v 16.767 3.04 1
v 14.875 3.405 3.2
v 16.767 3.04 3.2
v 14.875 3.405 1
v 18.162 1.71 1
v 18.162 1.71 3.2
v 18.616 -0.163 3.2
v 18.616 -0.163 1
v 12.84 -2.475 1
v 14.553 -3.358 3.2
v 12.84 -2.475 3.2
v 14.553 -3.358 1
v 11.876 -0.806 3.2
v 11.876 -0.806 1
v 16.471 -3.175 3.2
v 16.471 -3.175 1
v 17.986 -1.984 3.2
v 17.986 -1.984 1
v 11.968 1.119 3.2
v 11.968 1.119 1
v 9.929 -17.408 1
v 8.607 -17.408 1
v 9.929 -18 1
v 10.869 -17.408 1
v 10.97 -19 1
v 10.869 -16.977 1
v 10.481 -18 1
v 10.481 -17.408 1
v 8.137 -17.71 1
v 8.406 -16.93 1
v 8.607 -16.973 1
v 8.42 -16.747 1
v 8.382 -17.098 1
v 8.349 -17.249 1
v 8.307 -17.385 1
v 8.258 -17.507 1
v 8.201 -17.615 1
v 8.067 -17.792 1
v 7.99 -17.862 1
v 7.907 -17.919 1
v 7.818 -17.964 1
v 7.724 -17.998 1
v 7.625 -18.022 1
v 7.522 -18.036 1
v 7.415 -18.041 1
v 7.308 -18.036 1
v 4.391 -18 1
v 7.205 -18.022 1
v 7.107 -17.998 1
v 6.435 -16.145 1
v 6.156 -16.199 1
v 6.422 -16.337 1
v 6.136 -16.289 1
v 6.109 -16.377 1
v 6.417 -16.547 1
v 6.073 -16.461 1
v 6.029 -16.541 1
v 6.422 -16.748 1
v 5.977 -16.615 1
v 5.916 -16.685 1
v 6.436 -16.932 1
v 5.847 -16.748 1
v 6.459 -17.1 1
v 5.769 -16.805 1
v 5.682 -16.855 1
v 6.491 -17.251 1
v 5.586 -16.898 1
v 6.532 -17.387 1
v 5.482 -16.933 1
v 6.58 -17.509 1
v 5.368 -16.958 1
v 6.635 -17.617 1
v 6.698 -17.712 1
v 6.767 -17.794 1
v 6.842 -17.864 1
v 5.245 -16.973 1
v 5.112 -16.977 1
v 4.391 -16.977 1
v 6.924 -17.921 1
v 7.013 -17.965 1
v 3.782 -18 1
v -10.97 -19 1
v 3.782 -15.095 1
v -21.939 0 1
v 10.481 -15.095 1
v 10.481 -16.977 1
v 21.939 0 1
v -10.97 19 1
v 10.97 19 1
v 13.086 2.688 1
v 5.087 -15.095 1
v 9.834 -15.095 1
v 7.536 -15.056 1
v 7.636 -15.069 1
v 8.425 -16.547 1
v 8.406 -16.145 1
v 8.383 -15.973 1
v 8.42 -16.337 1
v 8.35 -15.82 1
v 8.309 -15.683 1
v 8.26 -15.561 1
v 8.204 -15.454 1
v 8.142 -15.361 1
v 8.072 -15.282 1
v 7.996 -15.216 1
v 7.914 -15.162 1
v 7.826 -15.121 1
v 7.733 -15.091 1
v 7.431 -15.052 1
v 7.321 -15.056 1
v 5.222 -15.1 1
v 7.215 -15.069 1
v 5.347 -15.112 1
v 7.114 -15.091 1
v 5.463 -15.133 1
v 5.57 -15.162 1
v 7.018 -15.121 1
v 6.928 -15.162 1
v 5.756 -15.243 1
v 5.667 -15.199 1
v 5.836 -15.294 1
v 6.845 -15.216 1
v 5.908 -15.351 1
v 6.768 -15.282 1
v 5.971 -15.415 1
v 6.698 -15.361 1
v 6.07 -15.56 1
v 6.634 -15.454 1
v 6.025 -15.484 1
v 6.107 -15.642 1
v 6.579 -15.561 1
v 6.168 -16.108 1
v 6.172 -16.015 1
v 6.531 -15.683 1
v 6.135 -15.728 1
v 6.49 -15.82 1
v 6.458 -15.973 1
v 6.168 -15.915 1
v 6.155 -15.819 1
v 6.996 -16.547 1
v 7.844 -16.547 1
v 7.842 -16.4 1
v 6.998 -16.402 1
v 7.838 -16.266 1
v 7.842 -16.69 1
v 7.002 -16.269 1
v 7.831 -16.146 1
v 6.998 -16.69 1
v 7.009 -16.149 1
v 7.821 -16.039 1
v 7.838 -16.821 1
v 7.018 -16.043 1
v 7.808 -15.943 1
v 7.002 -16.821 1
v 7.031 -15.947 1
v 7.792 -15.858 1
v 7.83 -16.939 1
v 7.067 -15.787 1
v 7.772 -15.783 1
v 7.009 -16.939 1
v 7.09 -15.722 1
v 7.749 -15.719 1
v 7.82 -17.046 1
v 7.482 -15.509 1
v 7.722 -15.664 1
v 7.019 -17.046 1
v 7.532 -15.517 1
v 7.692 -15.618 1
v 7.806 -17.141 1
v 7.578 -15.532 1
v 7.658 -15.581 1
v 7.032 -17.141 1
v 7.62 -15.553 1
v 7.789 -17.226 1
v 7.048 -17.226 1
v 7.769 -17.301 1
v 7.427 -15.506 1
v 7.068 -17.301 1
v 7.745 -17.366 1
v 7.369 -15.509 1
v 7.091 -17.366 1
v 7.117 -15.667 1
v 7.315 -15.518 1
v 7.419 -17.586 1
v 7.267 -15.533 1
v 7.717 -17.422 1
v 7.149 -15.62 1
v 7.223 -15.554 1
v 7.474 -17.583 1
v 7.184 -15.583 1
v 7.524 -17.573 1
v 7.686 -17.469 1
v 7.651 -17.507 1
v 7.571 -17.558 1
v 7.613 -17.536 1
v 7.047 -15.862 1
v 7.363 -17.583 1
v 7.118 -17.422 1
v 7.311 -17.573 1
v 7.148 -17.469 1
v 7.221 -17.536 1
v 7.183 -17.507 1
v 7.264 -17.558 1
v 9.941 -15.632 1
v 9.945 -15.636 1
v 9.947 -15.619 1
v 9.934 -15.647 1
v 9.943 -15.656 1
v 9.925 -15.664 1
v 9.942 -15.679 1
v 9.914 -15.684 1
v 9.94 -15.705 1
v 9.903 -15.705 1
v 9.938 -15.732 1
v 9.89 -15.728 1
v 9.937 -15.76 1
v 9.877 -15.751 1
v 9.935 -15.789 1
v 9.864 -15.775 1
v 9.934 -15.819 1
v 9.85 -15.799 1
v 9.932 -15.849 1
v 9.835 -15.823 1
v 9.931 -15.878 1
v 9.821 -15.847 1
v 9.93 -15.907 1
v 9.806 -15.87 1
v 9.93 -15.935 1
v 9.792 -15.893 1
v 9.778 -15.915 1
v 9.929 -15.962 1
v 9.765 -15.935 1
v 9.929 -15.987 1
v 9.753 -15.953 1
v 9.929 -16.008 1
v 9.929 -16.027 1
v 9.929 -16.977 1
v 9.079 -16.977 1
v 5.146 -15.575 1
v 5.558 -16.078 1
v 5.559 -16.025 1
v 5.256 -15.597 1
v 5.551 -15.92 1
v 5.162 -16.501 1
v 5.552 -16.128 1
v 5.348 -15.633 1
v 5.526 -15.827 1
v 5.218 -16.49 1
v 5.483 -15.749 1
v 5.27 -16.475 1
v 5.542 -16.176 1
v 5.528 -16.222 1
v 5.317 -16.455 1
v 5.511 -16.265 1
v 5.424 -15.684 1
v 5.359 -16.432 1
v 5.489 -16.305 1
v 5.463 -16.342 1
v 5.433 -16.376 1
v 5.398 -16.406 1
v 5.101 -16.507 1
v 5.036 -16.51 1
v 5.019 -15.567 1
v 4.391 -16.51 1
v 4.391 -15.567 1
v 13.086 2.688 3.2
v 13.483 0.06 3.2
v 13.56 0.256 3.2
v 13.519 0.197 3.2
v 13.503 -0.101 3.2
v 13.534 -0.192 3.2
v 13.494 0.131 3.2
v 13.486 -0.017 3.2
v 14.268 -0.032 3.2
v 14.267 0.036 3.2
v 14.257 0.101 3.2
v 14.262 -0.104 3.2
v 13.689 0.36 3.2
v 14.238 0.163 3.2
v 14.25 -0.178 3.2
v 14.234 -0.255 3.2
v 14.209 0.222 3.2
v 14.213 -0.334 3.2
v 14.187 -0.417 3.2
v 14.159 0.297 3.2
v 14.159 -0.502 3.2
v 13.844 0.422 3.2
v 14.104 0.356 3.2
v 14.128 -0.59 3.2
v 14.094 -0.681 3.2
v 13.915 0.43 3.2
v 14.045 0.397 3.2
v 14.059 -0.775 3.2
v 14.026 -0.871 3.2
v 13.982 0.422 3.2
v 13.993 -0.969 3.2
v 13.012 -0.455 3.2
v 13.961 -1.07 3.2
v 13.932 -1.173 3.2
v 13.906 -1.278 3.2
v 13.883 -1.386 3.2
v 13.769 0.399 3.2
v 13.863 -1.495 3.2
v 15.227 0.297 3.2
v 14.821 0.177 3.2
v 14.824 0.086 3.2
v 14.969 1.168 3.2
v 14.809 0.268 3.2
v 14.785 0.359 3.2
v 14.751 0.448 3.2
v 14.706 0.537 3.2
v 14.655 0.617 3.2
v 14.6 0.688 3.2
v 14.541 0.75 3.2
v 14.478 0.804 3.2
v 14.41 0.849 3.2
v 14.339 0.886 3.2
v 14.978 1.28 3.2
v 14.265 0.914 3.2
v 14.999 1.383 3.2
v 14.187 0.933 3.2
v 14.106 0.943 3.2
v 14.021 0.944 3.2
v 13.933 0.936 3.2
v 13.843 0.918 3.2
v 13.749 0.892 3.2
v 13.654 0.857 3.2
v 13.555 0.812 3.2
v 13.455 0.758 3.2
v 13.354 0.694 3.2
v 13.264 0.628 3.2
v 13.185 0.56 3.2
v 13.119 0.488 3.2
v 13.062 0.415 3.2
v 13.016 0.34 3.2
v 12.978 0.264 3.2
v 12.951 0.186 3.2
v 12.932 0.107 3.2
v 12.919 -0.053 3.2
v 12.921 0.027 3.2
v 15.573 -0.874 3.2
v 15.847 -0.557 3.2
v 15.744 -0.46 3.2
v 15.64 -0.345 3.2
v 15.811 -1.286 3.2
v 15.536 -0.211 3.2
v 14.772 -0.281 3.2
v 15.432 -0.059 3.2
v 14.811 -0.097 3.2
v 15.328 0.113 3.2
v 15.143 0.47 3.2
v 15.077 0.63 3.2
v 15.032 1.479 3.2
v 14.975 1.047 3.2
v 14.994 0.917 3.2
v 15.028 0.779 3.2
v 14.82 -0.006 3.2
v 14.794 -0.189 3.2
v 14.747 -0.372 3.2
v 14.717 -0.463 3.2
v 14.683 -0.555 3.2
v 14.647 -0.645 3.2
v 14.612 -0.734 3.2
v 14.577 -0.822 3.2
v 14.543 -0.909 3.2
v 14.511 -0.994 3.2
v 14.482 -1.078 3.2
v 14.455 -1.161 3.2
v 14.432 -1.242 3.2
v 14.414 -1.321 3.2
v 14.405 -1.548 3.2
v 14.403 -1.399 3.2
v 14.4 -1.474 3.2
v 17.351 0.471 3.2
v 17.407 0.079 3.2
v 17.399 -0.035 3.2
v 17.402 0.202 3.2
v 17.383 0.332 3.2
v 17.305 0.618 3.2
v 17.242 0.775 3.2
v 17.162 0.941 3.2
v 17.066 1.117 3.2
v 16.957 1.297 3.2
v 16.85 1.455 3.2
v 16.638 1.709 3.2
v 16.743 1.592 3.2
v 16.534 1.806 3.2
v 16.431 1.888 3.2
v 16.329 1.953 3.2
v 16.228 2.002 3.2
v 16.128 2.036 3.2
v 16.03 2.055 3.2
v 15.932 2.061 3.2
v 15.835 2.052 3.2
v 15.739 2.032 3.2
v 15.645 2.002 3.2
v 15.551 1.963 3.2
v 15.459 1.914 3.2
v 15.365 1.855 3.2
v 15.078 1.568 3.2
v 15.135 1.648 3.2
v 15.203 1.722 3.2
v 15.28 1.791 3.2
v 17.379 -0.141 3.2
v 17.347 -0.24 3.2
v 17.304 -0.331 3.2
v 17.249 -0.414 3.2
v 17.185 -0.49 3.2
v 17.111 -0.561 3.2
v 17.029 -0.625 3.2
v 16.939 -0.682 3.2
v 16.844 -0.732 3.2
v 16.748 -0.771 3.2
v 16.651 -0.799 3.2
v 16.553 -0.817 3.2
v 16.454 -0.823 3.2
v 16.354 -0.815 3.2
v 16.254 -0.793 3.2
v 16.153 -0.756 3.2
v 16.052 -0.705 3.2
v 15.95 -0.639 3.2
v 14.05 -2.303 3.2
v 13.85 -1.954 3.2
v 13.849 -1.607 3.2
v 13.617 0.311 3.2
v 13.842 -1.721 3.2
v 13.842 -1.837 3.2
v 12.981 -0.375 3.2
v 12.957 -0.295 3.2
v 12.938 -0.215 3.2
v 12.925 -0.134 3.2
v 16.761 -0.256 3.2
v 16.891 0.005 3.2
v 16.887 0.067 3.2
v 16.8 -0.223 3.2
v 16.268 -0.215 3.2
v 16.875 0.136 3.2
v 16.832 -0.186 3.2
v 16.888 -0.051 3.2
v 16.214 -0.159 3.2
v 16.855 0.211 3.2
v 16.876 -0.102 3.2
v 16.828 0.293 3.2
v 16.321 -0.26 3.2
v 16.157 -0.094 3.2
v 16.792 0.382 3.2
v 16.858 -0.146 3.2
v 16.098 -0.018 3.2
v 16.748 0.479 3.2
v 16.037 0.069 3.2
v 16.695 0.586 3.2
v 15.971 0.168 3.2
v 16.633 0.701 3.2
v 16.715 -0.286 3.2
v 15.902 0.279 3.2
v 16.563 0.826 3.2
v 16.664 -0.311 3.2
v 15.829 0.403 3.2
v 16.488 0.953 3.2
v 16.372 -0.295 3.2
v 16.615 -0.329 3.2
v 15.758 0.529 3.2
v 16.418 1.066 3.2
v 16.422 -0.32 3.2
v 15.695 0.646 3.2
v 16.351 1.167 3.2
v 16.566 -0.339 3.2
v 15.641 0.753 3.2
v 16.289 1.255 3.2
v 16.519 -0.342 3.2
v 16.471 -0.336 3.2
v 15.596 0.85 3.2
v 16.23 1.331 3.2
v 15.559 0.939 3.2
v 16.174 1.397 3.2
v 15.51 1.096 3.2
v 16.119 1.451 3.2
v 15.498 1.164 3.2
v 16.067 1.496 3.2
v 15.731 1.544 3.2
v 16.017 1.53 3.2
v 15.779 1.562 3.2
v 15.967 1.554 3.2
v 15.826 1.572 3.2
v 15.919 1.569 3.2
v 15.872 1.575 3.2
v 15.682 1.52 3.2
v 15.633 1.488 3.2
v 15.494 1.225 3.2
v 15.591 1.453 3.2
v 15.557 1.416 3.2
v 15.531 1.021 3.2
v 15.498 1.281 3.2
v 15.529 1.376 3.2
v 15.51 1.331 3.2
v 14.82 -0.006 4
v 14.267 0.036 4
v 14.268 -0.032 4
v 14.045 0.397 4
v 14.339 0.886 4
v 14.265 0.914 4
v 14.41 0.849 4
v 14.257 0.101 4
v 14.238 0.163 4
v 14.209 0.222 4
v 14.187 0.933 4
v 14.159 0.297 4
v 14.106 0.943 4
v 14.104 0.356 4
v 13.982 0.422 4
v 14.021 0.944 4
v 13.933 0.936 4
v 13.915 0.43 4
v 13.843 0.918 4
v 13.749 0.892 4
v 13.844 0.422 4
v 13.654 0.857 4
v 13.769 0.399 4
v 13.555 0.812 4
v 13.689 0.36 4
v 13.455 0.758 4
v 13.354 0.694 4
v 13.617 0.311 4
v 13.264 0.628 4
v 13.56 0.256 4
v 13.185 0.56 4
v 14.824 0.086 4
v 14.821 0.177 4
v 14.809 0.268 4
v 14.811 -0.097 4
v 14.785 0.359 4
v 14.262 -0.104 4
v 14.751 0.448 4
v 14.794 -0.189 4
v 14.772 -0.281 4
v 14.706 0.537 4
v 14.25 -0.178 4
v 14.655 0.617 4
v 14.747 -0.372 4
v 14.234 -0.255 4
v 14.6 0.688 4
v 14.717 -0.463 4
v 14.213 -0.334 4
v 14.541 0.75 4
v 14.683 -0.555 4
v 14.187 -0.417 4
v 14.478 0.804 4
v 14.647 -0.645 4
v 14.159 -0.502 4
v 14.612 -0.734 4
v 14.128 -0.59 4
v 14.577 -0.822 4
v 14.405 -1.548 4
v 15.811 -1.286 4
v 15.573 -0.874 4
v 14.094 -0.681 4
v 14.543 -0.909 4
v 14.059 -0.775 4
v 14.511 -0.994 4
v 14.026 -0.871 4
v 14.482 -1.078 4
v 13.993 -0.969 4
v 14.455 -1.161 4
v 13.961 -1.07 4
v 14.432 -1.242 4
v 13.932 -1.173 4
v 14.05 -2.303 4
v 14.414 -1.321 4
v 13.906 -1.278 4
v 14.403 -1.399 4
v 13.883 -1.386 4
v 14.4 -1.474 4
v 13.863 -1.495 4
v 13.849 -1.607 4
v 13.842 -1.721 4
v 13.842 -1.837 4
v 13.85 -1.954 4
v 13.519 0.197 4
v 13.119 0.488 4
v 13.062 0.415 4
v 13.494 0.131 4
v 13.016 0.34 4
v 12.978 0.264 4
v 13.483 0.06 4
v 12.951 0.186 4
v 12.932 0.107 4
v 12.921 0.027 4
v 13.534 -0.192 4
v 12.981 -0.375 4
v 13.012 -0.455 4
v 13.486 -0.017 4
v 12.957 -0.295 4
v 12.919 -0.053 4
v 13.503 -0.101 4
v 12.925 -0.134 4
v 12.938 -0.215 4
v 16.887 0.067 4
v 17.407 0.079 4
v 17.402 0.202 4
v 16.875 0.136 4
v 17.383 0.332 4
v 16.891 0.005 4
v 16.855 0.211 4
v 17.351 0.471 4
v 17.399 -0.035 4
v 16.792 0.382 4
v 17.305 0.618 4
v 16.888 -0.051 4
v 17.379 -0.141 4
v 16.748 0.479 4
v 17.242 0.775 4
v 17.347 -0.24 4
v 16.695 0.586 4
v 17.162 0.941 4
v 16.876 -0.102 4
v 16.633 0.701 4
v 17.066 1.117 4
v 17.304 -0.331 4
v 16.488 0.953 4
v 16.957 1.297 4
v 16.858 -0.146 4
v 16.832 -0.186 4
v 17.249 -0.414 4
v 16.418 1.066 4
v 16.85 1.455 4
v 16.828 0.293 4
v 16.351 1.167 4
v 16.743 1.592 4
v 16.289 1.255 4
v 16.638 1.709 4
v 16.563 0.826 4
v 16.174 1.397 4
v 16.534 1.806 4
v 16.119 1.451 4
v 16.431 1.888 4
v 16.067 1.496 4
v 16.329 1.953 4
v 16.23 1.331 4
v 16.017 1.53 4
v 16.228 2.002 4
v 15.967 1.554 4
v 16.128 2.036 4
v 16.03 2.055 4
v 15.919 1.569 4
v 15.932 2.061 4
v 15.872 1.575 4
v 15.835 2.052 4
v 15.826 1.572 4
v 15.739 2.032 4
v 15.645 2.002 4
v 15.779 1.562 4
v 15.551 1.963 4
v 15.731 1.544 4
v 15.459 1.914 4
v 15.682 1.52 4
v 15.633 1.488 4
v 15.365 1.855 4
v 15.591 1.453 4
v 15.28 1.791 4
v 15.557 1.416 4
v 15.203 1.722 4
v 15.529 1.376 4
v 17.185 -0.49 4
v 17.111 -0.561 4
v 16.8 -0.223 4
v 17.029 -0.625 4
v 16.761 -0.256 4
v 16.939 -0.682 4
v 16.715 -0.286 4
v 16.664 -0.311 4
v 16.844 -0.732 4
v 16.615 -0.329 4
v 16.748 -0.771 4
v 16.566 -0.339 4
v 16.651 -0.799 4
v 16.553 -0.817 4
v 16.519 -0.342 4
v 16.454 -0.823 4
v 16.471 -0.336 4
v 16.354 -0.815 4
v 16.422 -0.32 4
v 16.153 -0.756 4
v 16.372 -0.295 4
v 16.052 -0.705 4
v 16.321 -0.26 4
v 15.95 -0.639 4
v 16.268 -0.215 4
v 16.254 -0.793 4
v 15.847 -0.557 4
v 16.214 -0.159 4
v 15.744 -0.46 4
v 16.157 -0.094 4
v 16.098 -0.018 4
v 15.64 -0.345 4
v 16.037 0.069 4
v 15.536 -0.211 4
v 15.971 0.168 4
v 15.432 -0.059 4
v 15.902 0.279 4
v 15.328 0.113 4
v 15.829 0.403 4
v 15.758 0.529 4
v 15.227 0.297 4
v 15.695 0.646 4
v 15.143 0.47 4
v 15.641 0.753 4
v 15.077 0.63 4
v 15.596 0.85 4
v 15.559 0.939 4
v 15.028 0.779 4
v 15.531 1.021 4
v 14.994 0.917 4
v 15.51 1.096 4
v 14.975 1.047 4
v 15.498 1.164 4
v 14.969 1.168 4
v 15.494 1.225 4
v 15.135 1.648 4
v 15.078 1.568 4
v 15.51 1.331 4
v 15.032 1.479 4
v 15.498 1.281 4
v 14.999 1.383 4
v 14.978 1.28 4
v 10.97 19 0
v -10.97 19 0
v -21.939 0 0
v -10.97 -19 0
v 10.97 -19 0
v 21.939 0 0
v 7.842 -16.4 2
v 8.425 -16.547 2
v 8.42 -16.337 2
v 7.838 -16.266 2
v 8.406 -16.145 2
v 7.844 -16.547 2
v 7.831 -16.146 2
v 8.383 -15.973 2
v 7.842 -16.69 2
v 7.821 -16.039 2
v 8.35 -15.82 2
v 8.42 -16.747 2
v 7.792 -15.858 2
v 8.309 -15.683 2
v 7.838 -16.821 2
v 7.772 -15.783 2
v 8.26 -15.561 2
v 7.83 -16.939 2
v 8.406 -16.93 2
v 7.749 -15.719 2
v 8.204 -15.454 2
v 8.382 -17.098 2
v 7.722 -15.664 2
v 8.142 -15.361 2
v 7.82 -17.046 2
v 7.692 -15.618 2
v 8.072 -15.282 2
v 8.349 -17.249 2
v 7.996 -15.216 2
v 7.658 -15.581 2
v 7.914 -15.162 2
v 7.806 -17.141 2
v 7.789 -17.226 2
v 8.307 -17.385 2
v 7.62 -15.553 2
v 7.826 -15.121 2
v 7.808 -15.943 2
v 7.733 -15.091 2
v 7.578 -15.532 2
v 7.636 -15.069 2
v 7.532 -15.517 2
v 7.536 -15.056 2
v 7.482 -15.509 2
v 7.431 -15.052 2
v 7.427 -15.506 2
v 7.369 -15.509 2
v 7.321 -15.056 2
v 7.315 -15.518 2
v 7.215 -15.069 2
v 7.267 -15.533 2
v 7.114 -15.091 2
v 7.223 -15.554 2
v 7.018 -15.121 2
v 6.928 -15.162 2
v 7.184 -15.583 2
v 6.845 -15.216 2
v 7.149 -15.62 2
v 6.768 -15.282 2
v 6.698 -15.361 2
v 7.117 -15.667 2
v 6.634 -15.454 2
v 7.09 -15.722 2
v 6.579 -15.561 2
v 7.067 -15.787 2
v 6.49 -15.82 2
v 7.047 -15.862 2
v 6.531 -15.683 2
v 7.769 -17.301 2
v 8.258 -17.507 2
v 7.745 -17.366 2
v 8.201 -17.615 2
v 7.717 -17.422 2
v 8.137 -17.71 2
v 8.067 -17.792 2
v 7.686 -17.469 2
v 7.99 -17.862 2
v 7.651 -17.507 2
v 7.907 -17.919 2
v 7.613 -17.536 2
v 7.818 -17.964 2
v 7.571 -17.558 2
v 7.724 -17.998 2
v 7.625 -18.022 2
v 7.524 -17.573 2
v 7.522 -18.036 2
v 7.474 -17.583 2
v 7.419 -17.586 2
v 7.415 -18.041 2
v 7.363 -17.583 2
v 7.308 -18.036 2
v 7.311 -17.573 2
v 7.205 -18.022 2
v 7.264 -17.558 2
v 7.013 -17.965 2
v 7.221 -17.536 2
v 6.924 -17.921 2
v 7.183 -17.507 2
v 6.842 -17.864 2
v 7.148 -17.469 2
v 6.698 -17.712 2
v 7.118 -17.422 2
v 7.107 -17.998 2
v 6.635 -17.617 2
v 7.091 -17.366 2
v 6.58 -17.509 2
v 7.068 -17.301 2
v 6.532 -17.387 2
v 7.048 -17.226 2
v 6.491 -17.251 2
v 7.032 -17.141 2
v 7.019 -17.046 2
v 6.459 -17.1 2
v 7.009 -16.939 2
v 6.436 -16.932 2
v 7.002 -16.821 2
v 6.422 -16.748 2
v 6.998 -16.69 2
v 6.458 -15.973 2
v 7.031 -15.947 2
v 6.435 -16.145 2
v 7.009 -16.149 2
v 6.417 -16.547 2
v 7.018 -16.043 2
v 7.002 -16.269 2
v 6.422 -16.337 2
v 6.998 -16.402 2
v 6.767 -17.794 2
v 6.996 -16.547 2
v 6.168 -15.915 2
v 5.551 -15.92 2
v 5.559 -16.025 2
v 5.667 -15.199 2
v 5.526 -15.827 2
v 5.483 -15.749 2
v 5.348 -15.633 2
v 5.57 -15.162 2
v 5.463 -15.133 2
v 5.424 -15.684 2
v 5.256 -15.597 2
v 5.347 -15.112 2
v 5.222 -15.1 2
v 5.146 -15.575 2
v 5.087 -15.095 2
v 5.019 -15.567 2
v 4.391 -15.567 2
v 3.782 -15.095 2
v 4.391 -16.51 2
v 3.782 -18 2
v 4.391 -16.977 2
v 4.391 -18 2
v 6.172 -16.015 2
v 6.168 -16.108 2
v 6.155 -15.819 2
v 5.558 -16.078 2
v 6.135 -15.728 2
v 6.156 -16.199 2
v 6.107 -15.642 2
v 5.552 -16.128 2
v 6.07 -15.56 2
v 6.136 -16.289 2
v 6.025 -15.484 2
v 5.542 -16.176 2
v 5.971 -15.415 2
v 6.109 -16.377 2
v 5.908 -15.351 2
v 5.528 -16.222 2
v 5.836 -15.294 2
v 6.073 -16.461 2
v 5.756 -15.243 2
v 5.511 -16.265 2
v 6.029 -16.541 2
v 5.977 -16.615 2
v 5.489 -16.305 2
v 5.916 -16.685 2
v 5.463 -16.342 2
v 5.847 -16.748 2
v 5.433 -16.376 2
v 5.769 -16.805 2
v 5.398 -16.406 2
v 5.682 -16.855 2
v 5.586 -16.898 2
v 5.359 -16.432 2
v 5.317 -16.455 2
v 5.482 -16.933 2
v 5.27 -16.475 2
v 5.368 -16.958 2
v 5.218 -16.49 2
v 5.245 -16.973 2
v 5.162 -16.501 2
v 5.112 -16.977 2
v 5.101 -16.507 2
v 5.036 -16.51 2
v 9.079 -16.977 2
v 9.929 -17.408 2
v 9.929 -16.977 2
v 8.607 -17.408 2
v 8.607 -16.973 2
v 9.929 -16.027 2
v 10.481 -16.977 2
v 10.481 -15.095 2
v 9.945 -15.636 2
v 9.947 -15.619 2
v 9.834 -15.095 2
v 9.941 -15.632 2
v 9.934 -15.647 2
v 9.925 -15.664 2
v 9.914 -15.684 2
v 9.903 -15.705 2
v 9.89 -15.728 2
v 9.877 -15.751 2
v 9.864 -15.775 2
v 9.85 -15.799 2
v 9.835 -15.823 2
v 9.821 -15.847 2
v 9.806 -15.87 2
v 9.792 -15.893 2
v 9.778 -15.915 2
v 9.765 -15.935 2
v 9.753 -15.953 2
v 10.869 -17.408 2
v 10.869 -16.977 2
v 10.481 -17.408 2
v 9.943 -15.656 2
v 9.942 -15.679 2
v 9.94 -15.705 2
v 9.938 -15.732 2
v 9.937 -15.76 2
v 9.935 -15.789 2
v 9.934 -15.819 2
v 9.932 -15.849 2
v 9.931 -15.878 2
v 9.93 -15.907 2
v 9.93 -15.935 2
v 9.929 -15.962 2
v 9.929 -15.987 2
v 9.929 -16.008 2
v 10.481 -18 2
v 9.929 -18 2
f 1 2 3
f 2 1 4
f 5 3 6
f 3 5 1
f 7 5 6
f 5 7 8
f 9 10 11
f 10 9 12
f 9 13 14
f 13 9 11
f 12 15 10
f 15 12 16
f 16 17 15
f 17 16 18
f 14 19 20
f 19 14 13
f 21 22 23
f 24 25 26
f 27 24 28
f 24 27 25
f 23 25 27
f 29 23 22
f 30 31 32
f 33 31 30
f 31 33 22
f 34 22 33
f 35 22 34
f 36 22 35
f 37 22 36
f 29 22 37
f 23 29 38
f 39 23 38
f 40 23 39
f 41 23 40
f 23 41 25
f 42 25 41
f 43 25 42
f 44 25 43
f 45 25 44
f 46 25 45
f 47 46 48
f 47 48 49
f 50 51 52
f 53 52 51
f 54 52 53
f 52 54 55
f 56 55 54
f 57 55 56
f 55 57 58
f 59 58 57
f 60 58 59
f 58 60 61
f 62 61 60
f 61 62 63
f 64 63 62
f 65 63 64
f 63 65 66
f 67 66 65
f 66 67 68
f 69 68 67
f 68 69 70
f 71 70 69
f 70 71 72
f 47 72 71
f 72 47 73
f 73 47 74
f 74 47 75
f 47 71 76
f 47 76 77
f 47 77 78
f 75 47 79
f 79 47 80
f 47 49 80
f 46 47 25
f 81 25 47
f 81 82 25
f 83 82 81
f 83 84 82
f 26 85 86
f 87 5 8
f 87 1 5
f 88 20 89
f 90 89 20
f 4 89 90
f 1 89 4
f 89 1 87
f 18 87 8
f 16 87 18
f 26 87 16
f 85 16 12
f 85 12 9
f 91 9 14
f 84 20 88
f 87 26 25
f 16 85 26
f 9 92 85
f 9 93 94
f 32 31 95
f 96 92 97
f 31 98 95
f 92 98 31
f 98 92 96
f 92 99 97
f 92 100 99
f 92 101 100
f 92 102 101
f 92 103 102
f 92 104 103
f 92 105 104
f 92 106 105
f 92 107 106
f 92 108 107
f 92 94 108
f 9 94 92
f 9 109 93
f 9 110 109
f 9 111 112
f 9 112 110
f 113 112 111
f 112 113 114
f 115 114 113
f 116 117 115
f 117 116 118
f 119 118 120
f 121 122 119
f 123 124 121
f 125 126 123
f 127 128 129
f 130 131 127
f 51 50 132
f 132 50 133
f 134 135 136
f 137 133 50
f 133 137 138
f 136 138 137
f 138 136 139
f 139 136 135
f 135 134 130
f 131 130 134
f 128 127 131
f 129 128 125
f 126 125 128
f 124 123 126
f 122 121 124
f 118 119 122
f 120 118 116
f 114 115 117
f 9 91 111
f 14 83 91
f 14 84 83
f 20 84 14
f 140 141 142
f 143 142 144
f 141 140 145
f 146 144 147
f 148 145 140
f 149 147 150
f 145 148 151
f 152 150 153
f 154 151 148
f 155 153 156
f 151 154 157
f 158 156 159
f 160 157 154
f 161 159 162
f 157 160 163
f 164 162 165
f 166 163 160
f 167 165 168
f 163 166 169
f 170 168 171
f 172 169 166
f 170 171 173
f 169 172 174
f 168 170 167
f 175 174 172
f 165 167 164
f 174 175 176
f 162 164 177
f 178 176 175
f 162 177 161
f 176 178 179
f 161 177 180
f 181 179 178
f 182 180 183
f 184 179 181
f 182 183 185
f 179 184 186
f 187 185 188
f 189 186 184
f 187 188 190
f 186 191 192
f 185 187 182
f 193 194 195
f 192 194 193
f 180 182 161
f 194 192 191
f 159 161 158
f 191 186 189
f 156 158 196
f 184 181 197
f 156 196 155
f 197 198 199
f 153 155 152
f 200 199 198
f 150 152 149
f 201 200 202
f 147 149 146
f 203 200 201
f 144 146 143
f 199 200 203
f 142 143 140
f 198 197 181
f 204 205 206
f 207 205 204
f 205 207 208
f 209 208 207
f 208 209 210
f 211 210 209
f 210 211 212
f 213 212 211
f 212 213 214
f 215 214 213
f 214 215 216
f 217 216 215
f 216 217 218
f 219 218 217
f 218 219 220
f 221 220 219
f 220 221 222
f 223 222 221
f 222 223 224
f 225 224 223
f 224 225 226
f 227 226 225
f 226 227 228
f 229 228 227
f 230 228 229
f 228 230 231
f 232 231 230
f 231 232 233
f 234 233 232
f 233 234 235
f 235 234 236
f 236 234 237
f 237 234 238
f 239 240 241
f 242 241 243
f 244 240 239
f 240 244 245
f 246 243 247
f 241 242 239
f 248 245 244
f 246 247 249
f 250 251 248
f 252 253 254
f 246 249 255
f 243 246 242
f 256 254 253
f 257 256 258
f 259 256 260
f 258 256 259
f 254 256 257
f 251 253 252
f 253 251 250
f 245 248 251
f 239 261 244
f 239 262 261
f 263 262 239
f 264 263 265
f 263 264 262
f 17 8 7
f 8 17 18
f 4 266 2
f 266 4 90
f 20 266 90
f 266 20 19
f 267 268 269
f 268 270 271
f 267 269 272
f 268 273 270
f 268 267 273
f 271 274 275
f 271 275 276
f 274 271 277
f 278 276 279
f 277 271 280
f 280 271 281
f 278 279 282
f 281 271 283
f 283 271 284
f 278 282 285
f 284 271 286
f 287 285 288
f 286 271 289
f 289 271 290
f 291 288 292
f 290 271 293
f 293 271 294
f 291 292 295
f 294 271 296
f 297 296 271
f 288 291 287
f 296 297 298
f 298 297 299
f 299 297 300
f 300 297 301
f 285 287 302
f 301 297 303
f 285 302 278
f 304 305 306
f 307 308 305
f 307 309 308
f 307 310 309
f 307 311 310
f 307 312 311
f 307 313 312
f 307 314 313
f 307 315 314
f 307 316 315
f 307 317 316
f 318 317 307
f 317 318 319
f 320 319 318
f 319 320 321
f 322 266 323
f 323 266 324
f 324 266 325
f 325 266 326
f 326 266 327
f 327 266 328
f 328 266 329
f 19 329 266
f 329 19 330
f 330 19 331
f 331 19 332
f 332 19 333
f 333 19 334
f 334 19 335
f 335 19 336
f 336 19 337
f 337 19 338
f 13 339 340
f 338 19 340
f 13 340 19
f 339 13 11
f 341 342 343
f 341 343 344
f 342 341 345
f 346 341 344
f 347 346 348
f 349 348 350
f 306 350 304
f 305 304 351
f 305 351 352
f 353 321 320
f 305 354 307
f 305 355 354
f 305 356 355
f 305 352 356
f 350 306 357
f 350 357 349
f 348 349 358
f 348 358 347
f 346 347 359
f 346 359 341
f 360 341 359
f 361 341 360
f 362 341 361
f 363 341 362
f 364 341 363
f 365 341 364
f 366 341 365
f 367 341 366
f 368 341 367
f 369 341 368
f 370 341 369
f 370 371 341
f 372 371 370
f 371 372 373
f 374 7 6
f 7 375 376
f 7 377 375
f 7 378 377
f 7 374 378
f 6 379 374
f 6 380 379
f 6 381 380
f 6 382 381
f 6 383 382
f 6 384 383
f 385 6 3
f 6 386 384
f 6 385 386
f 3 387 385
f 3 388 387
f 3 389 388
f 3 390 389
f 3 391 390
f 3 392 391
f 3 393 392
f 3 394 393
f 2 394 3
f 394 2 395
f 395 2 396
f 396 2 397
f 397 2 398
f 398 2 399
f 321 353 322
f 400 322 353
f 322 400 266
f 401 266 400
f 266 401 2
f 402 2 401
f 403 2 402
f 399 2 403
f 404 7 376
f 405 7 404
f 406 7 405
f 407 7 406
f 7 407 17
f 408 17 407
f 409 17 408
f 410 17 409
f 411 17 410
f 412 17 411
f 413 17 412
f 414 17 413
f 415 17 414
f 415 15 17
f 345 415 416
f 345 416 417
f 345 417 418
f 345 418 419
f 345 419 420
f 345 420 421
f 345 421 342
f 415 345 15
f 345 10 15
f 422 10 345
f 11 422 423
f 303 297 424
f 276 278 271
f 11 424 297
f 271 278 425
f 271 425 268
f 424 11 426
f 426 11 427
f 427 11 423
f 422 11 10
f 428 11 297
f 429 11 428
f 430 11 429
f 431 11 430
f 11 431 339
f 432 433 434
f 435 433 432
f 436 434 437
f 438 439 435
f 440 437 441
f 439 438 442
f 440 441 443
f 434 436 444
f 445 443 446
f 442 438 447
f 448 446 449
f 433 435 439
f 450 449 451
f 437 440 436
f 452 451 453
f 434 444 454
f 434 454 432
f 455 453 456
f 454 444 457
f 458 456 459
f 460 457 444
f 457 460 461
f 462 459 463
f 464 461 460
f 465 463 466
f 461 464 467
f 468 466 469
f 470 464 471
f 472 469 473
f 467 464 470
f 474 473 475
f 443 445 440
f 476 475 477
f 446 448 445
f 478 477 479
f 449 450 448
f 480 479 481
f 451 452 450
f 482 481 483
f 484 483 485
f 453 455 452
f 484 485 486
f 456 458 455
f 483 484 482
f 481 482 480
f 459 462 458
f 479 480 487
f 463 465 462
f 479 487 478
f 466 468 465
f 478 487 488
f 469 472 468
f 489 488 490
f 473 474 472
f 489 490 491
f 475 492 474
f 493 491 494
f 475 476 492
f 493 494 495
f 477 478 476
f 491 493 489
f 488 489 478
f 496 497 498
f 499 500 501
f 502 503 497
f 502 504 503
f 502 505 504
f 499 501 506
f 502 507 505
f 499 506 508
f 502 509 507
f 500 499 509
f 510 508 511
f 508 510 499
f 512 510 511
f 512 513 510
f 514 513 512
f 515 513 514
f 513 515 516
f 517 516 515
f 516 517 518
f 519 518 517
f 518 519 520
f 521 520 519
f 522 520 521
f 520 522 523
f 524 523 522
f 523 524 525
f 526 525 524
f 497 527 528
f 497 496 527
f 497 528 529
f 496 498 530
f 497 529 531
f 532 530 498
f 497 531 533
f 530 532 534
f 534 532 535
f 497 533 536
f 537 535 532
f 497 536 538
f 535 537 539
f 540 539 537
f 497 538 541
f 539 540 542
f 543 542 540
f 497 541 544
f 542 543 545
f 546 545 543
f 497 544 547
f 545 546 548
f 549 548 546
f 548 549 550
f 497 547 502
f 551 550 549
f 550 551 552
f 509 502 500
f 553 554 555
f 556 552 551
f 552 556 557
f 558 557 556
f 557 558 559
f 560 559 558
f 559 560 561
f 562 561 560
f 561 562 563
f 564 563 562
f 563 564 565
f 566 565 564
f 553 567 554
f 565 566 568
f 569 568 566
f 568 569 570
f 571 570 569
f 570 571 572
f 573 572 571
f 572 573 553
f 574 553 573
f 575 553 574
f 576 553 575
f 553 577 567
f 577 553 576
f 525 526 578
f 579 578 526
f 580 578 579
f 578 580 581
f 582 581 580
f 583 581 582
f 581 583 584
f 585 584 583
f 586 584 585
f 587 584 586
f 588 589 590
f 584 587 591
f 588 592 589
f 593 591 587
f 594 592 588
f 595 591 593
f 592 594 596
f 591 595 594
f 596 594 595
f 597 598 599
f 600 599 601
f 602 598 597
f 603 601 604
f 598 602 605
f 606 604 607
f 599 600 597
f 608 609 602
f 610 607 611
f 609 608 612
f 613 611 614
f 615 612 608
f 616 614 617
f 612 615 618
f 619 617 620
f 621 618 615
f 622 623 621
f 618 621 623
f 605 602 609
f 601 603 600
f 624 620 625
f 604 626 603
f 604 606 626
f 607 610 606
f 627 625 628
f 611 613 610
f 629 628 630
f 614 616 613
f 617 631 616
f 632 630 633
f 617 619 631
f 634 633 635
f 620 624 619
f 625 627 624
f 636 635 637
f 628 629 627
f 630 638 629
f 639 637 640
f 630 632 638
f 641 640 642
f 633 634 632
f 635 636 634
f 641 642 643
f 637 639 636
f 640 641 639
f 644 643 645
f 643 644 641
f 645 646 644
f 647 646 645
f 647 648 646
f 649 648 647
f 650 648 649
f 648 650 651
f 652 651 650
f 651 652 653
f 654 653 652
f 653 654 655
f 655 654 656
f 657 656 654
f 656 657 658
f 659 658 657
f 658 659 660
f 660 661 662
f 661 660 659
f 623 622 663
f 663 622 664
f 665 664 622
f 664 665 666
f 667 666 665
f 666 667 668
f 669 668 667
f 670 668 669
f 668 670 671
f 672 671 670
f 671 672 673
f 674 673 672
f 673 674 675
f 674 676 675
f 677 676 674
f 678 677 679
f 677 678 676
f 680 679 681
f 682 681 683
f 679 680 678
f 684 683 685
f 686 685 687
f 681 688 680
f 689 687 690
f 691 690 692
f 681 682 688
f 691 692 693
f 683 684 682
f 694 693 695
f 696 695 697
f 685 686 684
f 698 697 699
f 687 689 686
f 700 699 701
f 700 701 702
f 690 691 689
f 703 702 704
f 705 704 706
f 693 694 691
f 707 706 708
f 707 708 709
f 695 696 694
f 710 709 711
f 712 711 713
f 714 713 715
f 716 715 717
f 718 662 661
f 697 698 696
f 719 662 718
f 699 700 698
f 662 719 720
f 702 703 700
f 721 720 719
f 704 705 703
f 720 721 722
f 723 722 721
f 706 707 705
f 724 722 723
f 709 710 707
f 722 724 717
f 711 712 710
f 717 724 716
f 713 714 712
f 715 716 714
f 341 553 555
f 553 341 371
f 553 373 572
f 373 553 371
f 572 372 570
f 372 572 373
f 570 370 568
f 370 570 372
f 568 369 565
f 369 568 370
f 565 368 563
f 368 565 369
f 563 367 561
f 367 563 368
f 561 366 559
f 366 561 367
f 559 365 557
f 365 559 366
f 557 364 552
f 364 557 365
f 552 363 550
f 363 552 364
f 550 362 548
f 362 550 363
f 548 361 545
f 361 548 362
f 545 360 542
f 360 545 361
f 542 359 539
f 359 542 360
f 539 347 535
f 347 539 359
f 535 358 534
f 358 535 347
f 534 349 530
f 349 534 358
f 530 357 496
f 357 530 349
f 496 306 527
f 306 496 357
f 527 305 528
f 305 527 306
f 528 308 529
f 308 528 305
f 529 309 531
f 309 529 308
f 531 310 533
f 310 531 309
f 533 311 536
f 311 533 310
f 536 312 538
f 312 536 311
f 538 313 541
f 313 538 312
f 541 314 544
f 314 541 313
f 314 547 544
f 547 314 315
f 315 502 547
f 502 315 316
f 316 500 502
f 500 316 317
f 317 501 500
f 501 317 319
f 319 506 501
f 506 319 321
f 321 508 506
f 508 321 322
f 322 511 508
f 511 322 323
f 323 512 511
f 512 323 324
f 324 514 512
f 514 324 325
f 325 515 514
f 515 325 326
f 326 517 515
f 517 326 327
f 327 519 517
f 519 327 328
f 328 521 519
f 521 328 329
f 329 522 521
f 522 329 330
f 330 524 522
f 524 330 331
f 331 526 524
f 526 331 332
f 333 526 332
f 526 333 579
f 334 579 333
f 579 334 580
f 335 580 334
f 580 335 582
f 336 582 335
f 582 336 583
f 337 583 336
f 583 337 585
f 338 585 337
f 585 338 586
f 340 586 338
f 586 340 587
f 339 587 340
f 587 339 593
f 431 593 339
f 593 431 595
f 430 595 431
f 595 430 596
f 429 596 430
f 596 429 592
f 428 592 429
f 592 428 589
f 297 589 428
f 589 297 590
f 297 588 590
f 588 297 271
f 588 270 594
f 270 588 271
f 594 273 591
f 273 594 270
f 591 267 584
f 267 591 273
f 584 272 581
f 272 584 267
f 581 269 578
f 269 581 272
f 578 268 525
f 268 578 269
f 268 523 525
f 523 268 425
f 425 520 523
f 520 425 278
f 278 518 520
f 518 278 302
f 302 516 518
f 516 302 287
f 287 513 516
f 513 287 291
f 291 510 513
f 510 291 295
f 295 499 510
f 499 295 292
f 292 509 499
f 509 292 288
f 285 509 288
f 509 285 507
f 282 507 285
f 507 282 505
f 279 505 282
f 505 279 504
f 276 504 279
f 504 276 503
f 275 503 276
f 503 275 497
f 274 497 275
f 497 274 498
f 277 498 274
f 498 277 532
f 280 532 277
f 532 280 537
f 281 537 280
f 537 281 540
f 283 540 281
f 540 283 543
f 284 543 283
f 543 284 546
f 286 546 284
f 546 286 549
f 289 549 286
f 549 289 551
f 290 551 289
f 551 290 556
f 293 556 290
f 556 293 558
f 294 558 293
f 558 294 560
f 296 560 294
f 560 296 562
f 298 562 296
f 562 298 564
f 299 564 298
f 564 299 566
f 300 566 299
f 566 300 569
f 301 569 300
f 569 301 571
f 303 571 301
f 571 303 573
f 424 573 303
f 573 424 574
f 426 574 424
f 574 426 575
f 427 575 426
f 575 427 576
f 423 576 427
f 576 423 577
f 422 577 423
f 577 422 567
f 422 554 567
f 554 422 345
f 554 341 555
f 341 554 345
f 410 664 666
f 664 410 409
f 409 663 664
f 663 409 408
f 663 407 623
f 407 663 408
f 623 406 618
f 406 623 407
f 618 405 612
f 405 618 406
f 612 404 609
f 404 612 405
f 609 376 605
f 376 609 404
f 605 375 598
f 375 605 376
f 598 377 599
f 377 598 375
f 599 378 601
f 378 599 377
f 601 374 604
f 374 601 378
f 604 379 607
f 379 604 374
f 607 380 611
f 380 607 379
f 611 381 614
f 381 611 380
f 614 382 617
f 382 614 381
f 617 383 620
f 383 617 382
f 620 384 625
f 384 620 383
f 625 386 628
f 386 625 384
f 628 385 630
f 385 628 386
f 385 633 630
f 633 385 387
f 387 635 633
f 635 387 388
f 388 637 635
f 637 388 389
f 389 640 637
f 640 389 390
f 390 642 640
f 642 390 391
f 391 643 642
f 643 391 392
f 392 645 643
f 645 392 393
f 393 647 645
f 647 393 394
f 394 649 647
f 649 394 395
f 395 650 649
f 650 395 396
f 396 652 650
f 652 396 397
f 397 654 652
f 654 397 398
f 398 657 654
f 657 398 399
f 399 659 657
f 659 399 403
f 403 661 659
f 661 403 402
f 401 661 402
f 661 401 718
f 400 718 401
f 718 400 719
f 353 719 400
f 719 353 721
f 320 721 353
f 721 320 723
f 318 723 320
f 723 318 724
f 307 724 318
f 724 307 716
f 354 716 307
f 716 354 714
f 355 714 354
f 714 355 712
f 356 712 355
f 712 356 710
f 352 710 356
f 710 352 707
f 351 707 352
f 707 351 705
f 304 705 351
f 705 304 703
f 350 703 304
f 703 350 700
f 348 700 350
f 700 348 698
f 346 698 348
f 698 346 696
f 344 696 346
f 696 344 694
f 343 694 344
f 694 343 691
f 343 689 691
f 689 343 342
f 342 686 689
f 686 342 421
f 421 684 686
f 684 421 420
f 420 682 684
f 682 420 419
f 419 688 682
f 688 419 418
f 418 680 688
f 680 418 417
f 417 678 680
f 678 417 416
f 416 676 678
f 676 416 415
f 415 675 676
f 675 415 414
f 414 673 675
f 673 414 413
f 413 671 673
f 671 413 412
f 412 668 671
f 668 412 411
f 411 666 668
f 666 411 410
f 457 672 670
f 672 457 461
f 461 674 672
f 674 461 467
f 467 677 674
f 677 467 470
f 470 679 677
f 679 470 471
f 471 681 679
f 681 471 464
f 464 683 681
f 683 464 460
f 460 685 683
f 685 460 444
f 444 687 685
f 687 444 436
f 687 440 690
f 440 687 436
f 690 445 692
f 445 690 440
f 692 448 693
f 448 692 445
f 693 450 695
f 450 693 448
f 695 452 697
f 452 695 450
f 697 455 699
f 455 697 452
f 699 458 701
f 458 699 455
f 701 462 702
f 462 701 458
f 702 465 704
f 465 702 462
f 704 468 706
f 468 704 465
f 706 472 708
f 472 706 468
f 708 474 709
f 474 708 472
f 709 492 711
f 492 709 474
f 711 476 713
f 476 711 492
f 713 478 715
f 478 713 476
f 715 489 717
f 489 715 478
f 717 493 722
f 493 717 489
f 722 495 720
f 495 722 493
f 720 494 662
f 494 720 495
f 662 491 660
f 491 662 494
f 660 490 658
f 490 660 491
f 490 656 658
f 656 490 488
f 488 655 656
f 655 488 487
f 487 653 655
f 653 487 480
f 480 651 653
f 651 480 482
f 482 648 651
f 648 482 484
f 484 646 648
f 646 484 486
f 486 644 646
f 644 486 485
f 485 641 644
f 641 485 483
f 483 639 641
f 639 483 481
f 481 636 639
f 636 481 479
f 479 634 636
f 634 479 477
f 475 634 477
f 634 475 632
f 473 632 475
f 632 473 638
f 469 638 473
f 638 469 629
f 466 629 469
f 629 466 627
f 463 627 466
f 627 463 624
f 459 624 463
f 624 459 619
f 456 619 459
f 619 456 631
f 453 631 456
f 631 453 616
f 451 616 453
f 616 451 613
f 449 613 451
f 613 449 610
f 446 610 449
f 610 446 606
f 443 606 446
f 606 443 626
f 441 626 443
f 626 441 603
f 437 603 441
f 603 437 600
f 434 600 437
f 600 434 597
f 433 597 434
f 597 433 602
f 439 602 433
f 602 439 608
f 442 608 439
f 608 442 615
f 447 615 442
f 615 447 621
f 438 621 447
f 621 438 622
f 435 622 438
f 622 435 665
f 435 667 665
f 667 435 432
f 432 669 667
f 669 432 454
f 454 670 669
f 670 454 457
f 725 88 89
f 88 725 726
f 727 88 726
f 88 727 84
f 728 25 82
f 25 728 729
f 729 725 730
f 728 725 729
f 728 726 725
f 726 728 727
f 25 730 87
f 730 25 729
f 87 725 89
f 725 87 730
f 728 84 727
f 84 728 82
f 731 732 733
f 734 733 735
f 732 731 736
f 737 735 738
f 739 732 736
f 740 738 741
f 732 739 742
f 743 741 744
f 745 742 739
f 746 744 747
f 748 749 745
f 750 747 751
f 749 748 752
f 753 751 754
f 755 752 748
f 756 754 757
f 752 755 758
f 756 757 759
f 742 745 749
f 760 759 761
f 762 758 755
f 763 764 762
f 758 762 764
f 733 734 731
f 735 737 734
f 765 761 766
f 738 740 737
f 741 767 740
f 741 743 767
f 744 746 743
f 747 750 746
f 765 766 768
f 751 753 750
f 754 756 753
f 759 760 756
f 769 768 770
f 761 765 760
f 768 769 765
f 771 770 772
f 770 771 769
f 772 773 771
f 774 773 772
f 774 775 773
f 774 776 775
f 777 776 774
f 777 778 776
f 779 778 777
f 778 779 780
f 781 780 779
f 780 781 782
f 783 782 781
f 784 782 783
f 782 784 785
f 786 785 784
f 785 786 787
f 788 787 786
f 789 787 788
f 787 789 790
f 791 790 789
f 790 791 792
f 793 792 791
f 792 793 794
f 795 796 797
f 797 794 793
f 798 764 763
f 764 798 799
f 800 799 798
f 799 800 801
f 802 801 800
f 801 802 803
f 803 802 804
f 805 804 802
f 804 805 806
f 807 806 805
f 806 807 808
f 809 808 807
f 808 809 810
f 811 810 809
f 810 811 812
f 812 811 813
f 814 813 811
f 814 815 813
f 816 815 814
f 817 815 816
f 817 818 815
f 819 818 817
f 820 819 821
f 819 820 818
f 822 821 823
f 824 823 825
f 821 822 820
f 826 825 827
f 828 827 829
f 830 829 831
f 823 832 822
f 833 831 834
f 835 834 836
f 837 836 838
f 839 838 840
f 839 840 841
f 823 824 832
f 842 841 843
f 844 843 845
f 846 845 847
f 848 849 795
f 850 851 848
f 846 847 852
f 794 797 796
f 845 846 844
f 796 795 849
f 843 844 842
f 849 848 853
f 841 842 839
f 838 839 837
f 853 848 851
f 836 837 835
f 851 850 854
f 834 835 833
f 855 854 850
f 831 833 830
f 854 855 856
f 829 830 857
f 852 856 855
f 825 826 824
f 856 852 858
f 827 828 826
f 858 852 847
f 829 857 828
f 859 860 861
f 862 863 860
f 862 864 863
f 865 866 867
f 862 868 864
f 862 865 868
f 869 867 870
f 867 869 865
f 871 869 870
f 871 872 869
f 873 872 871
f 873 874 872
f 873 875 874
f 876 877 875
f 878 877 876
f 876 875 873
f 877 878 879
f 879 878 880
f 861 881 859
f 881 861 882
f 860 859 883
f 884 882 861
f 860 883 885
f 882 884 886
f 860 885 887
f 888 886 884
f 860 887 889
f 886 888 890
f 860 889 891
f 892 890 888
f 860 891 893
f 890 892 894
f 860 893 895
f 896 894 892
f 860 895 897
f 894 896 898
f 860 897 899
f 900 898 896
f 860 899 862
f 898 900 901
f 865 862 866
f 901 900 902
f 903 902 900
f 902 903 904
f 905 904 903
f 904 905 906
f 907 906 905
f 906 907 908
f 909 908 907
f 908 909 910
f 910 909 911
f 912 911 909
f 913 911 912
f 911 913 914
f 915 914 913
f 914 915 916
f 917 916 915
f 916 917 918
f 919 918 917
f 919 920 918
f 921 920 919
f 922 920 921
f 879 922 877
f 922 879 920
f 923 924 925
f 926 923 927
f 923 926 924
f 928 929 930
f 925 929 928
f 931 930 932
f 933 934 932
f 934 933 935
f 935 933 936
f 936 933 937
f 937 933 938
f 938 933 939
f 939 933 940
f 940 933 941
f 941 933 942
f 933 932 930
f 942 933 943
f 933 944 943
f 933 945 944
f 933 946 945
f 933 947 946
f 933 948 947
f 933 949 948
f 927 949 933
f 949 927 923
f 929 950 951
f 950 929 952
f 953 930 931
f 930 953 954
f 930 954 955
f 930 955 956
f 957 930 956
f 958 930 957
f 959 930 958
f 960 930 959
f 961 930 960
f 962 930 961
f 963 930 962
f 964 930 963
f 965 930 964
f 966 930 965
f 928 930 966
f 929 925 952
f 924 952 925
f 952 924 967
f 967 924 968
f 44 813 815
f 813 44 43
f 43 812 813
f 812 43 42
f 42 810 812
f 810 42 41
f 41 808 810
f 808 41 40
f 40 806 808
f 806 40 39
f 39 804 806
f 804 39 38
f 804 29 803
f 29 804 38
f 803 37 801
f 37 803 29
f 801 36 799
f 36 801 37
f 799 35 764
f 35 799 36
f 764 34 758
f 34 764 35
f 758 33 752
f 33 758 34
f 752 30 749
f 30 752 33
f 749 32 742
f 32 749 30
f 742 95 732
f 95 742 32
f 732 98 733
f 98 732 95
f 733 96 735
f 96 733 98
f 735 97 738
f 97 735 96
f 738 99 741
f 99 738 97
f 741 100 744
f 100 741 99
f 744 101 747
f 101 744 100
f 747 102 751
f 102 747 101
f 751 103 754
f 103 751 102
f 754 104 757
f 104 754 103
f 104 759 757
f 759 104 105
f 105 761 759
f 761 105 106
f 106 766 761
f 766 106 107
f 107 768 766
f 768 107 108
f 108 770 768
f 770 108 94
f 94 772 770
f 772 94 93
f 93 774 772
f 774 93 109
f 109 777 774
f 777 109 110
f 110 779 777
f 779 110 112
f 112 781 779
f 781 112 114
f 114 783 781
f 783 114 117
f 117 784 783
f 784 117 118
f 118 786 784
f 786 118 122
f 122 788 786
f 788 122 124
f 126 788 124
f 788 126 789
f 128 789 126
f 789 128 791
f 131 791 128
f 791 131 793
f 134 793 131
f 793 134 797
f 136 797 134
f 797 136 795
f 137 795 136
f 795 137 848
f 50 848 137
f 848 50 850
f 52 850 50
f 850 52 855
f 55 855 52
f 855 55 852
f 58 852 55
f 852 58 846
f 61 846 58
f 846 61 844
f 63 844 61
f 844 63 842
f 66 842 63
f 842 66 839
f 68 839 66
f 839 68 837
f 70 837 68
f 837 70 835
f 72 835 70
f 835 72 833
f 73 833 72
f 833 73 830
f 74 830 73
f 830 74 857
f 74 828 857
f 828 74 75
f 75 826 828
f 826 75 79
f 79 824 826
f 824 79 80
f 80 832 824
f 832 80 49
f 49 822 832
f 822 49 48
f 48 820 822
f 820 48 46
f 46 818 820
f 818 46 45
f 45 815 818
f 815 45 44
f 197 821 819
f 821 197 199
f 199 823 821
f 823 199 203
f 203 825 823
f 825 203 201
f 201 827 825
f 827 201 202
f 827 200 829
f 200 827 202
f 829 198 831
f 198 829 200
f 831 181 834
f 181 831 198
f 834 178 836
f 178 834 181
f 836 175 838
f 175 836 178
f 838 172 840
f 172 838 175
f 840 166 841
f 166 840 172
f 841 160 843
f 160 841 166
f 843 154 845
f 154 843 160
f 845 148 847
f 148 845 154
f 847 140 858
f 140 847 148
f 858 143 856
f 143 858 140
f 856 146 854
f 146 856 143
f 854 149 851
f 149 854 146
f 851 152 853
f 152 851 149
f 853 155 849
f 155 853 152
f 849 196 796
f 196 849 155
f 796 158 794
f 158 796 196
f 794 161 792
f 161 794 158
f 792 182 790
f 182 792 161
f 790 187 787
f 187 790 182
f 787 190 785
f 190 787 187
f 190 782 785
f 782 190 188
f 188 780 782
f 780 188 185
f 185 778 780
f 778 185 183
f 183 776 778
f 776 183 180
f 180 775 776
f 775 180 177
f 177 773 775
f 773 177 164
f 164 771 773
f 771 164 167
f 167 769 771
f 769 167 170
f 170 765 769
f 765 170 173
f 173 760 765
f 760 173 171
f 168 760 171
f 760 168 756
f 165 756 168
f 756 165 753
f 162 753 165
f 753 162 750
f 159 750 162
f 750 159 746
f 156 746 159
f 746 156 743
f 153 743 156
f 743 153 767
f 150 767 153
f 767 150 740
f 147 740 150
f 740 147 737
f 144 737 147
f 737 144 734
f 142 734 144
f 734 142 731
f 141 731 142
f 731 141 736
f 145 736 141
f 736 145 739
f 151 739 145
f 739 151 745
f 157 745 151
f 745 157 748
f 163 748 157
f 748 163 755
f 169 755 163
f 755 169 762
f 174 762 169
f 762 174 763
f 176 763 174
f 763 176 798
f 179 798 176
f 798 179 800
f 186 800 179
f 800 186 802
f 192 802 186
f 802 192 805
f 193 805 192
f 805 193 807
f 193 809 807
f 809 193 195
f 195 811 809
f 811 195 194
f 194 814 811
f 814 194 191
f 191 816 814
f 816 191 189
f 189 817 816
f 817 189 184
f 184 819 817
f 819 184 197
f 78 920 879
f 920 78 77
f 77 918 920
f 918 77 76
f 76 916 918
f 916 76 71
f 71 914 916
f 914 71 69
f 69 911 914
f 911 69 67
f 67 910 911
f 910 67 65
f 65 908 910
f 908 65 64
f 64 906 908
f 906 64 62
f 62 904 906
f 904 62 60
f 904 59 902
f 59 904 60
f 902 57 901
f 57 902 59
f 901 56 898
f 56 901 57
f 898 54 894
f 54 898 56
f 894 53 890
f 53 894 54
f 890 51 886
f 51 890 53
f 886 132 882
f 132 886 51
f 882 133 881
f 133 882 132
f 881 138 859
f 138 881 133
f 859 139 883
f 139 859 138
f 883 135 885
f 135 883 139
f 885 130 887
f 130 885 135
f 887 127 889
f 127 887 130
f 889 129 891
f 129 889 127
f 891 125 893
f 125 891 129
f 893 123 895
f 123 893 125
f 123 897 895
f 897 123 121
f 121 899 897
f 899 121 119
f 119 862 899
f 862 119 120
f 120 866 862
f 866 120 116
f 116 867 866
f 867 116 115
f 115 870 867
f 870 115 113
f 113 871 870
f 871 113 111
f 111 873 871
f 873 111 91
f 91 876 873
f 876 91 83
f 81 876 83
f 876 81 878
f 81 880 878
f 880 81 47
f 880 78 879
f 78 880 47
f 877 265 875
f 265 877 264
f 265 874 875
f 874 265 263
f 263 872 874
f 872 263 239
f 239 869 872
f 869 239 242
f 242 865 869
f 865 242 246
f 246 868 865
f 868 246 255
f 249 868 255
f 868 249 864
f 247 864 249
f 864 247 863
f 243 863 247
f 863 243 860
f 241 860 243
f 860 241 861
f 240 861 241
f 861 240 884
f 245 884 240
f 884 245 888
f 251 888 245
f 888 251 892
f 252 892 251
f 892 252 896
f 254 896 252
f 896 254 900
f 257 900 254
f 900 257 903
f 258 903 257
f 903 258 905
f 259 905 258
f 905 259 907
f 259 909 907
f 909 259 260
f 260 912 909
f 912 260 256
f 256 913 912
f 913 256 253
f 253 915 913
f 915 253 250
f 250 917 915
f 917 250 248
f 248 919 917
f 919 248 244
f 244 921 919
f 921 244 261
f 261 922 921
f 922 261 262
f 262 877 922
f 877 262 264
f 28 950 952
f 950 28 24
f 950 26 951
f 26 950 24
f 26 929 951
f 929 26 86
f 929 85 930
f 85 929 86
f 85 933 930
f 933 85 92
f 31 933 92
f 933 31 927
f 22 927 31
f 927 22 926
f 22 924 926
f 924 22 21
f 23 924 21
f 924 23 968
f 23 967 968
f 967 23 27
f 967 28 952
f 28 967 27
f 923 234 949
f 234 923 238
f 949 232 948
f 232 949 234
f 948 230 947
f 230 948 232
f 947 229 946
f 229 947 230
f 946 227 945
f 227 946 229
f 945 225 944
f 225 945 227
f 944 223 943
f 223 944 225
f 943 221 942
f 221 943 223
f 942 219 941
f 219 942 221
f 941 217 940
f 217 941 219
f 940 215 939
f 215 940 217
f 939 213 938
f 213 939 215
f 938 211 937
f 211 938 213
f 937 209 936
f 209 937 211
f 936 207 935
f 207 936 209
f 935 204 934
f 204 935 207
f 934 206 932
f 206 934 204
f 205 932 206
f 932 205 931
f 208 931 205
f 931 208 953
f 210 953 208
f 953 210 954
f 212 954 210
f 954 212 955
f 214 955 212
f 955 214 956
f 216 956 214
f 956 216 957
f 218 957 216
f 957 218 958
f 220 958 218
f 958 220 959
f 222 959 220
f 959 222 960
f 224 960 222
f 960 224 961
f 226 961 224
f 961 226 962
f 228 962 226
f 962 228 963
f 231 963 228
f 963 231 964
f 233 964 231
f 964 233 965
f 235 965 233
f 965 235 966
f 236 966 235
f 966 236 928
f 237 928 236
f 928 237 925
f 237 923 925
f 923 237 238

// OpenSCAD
include <../../Scripts/18xx tiles basic functions.scad>
hex("blue");
put_tilenr("P04");
put_value_blue("20",90);
